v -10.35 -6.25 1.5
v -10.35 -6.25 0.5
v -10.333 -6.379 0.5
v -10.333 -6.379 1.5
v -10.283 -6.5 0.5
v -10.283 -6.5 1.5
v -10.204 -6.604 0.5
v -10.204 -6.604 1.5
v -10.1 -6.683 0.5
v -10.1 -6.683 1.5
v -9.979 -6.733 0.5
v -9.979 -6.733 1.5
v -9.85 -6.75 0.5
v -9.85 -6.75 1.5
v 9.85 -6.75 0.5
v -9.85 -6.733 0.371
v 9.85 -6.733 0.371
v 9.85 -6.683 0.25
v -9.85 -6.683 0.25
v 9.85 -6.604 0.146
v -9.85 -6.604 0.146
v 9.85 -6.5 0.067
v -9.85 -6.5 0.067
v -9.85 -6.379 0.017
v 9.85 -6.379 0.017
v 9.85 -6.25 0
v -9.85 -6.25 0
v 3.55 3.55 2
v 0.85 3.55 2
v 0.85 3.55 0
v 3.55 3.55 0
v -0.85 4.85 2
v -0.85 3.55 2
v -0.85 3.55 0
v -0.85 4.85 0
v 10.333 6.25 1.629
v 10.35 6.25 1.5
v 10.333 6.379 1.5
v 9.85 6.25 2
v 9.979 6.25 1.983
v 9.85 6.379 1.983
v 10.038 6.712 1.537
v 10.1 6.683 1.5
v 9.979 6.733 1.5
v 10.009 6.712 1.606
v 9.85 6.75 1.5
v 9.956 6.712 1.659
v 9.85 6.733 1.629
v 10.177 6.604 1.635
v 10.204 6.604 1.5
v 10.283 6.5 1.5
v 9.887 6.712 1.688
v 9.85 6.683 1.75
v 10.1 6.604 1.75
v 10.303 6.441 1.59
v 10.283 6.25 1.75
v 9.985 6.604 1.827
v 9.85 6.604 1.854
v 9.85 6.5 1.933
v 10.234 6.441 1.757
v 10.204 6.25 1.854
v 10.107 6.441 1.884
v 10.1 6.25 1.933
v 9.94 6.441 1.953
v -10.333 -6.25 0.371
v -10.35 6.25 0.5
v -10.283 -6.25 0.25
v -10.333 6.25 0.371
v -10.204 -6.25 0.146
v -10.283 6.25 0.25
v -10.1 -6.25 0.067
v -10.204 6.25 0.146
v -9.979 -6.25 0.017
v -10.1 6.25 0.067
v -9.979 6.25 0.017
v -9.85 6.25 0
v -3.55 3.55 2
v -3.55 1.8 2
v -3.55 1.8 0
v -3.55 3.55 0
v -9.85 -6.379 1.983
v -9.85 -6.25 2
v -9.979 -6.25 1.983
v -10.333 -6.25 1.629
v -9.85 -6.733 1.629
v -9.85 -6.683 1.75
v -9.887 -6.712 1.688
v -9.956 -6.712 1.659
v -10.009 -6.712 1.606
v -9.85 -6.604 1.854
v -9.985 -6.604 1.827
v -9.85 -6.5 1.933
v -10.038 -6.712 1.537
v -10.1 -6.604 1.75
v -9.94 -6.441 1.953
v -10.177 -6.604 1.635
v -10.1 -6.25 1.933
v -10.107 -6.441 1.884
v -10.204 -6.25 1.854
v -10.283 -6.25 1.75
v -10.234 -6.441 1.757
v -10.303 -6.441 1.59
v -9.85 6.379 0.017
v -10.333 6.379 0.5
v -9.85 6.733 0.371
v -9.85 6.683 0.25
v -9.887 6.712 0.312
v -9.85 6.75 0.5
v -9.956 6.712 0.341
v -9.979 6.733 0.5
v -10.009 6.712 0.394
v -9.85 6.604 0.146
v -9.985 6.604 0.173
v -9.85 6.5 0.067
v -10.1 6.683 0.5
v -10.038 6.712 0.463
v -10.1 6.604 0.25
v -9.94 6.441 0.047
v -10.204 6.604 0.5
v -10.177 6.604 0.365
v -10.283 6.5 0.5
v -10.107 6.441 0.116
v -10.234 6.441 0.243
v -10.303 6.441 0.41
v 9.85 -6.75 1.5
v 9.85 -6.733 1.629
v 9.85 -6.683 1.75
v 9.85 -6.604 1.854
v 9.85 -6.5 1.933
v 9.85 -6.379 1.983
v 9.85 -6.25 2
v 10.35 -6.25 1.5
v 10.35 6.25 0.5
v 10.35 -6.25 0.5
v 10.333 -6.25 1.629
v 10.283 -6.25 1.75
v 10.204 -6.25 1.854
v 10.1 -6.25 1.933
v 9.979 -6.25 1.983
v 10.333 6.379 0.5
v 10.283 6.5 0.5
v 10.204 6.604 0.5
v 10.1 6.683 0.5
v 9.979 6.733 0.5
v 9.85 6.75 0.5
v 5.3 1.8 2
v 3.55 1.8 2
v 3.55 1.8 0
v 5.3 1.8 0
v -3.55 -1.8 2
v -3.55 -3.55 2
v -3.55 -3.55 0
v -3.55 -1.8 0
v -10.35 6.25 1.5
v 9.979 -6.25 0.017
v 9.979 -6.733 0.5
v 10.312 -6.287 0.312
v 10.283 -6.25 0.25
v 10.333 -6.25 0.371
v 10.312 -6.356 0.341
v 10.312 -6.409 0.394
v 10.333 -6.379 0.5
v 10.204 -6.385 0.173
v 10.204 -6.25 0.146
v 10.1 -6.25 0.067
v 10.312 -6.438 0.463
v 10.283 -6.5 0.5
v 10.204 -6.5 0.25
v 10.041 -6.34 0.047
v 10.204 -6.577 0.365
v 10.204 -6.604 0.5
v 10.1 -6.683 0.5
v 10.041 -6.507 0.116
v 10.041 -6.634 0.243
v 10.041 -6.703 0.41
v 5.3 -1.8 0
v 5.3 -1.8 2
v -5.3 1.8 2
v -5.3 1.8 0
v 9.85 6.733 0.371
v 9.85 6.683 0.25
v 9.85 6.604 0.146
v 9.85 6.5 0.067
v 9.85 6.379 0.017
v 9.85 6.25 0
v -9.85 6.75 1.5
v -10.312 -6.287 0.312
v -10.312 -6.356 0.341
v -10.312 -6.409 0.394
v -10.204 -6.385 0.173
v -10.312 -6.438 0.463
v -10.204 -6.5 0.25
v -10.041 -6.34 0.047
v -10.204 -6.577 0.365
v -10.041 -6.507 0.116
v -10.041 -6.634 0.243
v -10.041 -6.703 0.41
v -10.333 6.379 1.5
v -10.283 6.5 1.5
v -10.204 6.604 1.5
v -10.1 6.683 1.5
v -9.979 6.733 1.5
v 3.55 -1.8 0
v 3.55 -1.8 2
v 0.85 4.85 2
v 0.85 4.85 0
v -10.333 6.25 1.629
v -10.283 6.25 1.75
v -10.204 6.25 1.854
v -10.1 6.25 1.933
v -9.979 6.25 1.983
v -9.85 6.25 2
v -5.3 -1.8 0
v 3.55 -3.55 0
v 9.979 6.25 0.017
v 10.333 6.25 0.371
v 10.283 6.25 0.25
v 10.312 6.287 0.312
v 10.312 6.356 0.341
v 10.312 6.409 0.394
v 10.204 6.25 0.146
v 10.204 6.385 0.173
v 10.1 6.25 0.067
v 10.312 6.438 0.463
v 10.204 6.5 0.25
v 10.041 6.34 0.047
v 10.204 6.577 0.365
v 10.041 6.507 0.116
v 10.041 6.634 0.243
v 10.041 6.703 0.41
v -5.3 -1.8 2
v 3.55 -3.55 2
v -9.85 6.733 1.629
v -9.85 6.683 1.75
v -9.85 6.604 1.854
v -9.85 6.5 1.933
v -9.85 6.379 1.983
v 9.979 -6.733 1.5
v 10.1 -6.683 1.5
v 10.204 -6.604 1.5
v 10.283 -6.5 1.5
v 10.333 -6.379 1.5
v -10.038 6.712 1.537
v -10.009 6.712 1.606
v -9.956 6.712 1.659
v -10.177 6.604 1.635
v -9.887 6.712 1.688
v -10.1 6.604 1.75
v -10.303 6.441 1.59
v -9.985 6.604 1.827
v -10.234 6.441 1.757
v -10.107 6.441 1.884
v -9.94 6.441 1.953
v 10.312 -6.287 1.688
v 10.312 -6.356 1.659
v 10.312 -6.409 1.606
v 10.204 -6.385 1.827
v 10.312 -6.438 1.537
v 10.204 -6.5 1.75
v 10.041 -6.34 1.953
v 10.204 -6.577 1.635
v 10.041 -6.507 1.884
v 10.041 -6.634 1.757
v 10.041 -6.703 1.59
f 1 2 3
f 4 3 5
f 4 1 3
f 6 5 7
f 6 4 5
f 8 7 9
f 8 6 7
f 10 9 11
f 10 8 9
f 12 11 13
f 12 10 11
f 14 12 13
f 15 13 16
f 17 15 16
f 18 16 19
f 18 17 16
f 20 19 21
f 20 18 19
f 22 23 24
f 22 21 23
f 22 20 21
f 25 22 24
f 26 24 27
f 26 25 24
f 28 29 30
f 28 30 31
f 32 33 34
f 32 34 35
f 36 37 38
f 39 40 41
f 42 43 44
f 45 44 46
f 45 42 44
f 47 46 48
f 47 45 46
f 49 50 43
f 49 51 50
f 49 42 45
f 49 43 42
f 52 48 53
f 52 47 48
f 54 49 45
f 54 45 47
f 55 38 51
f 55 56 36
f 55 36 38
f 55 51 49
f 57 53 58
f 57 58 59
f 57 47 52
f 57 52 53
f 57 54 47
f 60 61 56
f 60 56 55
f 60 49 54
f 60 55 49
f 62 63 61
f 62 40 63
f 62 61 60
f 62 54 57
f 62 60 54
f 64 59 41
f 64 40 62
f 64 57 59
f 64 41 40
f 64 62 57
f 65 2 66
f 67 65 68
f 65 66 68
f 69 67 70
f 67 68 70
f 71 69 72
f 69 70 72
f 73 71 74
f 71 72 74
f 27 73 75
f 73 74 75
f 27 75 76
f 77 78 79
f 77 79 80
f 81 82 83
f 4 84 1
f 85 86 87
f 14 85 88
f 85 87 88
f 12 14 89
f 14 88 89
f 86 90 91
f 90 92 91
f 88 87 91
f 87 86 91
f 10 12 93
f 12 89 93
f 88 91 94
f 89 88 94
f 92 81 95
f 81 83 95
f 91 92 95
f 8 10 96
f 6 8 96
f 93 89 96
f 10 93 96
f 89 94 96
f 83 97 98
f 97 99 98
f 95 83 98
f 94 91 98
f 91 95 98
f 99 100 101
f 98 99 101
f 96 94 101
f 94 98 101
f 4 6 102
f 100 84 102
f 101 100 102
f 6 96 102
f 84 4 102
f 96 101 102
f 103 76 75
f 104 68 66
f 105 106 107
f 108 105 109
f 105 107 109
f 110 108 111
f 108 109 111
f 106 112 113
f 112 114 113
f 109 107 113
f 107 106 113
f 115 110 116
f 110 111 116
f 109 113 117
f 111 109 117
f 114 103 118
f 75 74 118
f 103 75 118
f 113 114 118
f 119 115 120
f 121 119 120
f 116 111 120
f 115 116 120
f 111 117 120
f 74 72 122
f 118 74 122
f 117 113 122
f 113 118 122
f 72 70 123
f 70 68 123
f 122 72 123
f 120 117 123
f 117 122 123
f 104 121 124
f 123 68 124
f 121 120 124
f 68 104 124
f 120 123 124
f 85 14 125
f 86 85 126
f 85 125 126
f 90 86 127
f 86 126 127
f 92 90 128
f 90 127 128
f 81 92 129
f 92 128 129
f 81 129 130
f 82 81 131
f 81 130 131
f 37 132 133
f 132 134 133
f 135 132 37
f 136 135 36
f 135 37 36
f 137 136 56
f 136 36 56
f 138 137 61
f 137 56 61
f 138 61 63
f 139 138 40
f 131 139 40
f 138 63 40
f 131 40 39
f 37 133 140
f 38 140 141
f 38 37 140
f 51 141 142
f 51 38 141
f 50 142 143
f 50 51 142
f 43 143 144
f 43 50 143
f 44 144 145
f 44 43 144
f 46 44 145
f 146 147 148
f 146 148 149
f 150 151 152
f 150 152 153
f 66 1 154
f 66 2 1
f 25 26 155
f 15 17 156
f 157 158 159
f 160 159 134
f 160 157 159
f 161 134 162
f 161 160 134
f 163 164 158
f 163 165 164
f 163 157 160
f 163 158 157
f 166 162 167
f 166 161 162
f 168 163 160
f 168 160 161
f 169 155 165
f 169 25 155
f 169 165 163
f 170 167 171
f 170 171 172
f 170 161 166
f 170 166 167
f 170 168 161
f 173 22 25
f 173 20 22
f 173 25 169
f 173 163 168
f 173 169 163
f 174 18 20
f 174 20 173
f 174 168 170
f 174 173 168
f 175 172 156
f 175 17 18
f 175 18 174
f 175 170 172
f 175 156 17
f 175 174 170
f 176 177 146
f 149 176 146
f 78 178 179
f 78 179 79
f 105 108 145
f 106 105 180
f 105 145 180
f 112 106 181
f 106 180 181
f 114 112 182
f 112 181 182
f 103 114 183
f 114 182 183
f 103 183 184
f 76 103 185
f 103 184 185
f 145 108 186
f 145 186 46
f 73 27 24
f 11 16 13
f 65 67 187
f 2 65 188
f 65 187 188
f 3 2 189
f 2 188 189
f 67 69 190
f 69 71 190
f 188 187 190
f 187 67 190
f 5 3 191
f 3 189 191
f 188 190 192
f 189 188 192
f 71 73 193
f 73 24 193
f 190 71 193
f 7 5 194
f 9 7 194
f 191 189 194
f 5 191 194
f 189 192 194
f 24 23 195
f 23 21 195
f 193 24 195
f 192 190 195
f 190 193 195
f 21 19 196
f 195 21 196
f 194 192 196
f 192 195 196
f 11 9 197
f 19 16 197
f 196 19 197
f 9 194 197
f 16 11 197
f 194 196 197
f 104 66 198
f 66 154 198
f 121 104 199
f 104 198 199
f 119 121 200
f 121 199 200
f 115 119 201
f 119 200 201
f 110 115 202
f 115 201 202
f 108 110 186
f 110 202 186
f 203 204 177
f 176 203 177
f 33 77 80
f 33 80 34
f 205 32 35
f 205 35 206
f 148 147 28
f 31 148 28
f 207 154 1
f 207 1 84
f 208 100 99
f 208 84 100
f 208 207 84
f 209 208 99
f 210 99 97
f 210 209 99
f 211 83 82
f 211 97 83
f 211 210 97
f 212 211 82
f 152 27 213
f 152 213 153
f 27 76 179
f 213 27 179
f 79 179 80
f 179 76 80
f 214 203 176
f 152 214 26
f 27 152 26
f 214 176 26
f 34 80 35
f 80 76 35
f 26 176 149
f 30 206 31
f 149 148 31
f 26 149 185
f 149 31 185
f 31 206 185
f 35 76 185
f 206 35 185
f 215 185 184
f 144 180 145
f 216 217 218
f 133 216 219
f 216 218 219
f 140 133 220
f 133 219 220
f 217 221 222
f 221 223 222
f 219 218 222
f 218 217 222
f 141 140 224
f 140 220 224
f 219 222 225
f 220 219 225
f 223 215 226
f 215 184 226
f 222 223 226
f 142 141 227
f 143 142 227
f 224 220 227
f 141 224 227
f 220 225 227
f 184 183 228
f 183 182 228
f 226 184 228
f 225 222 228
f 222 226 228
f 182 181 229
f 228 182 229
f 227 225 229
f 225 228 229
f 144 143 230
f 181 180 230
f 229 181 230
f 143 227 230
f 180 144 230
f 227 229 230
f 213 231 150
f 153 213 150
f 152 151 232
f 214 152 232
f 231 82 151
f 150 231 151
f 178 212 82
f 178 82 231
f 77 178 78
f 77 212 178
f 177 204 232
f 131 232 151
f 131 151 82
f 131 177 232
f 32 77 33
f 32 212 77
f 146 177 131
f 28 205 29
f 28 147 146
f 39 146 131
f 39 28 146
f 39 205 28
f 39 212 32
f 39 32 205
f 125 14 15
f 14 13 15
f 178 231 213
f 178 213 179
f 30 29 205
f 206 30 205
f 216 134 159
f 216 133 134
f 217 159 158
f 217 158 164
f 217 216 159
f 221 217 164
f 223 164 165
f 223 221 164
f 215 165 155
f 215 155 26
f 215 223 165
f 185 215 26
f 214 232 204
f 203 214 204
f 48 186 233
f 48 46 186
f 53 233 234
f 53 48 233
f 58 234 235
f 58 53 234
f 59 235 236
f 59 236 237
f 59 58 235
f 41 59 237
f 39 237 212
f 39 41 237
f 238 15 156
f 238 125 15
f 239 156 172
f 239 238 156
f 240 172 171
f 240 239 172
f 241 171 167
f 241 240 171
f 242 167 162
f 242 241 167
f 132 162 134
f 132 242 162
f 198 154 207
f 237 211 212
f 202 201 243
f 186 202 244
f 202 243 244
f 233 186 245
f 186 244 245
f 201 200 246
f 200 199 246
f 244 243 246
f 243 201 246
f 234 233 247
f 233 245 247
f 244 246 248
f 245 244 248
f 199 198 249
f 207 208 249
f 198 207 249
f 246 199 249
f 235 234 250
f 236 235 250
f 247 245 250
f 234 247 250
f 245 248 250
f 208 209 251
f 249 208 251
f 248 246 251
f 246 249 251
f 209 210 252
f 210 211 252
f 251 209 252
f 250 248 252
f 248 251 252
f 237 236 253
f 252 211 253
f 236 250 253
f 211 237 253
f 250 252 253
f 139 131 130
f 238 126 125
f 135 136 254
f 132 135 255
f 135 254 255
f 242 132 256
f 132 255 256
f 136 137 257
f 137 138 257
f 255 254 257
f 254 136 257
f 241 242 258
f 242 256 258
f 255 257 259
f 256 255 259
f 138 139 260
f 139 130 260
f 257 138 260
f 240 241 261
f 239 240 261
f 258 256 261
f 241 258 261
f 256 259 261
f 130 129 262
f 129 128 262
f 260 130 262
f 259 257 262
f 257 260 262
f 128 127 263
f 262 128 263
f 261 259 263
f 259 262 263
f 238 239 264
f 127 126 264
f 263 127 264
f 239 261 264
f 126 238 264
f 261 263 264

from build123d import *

# Parameters (mm, degrees)
SKETCH1_W           = 20.7
SKETCH1_H           = 13.5
BOSS_EXTRUDE1_DEPTH = 2
FILLET1_R           = 0.5
SKETCH2_W           = 10.6
SKETCH2_H           = 3.6
SKETCH2_W_2         = 7.1
SKETCH2_H_2         = 7.1
SKETCH2_W_3         = 1.7
SKETCH2_H_3         = 4.85
CUT_EXTRUDE1_DEPTH  = 13.517387906


with BuildPart() as part:
    # Sketch1 → Boss-Extrude1 (new body)
    with BuildSketch(Plane.XY):
        Rectangle(SKETCH1_W, SKETCH1_H)
    extrude(amount=BOSS_EXTRUDE1_DEPTH)

    # Fillet1
    fillet1_edges = [part.edges().sort_by_distance(p)[0] for p in [
        (-10.35, 0, 2),
        (0, -6.75, 2),
        (10.35, 0, 2),
        (0, -6.75, 0),
        (-10.35, 0, 0),
        (0, 6.75, 0),
        (10.35, 0, 0),
        (10.35, -6.75, 1),
        (-10.35, -6.75, 1),
        (-10.35, 6.75, 1),
        (10.35, 6.75, 1),
        (0, 6.75, 2),
    ]]
    fillet(fillet1_edges, radius=FILLET1_R)

    # Sketch2 → Cut-Extrude1 (cut, through all)
    with BuildSketch(Plane.XY.offset(2)):
        Rectangle(SKETCH2_W, SKETCH2_H)
        Rectangle(SKETCH2_W_2, SKETCH2_H_2)
        with Locations((0, 2.425)):
            Rectangle(SKETCH2_W_3, SKETCH2_H_3)
    extrude(amount=-CUT_EXTRUDE1_DEPTH, mode=Mode.SUBTRACT)


solid = part.part
